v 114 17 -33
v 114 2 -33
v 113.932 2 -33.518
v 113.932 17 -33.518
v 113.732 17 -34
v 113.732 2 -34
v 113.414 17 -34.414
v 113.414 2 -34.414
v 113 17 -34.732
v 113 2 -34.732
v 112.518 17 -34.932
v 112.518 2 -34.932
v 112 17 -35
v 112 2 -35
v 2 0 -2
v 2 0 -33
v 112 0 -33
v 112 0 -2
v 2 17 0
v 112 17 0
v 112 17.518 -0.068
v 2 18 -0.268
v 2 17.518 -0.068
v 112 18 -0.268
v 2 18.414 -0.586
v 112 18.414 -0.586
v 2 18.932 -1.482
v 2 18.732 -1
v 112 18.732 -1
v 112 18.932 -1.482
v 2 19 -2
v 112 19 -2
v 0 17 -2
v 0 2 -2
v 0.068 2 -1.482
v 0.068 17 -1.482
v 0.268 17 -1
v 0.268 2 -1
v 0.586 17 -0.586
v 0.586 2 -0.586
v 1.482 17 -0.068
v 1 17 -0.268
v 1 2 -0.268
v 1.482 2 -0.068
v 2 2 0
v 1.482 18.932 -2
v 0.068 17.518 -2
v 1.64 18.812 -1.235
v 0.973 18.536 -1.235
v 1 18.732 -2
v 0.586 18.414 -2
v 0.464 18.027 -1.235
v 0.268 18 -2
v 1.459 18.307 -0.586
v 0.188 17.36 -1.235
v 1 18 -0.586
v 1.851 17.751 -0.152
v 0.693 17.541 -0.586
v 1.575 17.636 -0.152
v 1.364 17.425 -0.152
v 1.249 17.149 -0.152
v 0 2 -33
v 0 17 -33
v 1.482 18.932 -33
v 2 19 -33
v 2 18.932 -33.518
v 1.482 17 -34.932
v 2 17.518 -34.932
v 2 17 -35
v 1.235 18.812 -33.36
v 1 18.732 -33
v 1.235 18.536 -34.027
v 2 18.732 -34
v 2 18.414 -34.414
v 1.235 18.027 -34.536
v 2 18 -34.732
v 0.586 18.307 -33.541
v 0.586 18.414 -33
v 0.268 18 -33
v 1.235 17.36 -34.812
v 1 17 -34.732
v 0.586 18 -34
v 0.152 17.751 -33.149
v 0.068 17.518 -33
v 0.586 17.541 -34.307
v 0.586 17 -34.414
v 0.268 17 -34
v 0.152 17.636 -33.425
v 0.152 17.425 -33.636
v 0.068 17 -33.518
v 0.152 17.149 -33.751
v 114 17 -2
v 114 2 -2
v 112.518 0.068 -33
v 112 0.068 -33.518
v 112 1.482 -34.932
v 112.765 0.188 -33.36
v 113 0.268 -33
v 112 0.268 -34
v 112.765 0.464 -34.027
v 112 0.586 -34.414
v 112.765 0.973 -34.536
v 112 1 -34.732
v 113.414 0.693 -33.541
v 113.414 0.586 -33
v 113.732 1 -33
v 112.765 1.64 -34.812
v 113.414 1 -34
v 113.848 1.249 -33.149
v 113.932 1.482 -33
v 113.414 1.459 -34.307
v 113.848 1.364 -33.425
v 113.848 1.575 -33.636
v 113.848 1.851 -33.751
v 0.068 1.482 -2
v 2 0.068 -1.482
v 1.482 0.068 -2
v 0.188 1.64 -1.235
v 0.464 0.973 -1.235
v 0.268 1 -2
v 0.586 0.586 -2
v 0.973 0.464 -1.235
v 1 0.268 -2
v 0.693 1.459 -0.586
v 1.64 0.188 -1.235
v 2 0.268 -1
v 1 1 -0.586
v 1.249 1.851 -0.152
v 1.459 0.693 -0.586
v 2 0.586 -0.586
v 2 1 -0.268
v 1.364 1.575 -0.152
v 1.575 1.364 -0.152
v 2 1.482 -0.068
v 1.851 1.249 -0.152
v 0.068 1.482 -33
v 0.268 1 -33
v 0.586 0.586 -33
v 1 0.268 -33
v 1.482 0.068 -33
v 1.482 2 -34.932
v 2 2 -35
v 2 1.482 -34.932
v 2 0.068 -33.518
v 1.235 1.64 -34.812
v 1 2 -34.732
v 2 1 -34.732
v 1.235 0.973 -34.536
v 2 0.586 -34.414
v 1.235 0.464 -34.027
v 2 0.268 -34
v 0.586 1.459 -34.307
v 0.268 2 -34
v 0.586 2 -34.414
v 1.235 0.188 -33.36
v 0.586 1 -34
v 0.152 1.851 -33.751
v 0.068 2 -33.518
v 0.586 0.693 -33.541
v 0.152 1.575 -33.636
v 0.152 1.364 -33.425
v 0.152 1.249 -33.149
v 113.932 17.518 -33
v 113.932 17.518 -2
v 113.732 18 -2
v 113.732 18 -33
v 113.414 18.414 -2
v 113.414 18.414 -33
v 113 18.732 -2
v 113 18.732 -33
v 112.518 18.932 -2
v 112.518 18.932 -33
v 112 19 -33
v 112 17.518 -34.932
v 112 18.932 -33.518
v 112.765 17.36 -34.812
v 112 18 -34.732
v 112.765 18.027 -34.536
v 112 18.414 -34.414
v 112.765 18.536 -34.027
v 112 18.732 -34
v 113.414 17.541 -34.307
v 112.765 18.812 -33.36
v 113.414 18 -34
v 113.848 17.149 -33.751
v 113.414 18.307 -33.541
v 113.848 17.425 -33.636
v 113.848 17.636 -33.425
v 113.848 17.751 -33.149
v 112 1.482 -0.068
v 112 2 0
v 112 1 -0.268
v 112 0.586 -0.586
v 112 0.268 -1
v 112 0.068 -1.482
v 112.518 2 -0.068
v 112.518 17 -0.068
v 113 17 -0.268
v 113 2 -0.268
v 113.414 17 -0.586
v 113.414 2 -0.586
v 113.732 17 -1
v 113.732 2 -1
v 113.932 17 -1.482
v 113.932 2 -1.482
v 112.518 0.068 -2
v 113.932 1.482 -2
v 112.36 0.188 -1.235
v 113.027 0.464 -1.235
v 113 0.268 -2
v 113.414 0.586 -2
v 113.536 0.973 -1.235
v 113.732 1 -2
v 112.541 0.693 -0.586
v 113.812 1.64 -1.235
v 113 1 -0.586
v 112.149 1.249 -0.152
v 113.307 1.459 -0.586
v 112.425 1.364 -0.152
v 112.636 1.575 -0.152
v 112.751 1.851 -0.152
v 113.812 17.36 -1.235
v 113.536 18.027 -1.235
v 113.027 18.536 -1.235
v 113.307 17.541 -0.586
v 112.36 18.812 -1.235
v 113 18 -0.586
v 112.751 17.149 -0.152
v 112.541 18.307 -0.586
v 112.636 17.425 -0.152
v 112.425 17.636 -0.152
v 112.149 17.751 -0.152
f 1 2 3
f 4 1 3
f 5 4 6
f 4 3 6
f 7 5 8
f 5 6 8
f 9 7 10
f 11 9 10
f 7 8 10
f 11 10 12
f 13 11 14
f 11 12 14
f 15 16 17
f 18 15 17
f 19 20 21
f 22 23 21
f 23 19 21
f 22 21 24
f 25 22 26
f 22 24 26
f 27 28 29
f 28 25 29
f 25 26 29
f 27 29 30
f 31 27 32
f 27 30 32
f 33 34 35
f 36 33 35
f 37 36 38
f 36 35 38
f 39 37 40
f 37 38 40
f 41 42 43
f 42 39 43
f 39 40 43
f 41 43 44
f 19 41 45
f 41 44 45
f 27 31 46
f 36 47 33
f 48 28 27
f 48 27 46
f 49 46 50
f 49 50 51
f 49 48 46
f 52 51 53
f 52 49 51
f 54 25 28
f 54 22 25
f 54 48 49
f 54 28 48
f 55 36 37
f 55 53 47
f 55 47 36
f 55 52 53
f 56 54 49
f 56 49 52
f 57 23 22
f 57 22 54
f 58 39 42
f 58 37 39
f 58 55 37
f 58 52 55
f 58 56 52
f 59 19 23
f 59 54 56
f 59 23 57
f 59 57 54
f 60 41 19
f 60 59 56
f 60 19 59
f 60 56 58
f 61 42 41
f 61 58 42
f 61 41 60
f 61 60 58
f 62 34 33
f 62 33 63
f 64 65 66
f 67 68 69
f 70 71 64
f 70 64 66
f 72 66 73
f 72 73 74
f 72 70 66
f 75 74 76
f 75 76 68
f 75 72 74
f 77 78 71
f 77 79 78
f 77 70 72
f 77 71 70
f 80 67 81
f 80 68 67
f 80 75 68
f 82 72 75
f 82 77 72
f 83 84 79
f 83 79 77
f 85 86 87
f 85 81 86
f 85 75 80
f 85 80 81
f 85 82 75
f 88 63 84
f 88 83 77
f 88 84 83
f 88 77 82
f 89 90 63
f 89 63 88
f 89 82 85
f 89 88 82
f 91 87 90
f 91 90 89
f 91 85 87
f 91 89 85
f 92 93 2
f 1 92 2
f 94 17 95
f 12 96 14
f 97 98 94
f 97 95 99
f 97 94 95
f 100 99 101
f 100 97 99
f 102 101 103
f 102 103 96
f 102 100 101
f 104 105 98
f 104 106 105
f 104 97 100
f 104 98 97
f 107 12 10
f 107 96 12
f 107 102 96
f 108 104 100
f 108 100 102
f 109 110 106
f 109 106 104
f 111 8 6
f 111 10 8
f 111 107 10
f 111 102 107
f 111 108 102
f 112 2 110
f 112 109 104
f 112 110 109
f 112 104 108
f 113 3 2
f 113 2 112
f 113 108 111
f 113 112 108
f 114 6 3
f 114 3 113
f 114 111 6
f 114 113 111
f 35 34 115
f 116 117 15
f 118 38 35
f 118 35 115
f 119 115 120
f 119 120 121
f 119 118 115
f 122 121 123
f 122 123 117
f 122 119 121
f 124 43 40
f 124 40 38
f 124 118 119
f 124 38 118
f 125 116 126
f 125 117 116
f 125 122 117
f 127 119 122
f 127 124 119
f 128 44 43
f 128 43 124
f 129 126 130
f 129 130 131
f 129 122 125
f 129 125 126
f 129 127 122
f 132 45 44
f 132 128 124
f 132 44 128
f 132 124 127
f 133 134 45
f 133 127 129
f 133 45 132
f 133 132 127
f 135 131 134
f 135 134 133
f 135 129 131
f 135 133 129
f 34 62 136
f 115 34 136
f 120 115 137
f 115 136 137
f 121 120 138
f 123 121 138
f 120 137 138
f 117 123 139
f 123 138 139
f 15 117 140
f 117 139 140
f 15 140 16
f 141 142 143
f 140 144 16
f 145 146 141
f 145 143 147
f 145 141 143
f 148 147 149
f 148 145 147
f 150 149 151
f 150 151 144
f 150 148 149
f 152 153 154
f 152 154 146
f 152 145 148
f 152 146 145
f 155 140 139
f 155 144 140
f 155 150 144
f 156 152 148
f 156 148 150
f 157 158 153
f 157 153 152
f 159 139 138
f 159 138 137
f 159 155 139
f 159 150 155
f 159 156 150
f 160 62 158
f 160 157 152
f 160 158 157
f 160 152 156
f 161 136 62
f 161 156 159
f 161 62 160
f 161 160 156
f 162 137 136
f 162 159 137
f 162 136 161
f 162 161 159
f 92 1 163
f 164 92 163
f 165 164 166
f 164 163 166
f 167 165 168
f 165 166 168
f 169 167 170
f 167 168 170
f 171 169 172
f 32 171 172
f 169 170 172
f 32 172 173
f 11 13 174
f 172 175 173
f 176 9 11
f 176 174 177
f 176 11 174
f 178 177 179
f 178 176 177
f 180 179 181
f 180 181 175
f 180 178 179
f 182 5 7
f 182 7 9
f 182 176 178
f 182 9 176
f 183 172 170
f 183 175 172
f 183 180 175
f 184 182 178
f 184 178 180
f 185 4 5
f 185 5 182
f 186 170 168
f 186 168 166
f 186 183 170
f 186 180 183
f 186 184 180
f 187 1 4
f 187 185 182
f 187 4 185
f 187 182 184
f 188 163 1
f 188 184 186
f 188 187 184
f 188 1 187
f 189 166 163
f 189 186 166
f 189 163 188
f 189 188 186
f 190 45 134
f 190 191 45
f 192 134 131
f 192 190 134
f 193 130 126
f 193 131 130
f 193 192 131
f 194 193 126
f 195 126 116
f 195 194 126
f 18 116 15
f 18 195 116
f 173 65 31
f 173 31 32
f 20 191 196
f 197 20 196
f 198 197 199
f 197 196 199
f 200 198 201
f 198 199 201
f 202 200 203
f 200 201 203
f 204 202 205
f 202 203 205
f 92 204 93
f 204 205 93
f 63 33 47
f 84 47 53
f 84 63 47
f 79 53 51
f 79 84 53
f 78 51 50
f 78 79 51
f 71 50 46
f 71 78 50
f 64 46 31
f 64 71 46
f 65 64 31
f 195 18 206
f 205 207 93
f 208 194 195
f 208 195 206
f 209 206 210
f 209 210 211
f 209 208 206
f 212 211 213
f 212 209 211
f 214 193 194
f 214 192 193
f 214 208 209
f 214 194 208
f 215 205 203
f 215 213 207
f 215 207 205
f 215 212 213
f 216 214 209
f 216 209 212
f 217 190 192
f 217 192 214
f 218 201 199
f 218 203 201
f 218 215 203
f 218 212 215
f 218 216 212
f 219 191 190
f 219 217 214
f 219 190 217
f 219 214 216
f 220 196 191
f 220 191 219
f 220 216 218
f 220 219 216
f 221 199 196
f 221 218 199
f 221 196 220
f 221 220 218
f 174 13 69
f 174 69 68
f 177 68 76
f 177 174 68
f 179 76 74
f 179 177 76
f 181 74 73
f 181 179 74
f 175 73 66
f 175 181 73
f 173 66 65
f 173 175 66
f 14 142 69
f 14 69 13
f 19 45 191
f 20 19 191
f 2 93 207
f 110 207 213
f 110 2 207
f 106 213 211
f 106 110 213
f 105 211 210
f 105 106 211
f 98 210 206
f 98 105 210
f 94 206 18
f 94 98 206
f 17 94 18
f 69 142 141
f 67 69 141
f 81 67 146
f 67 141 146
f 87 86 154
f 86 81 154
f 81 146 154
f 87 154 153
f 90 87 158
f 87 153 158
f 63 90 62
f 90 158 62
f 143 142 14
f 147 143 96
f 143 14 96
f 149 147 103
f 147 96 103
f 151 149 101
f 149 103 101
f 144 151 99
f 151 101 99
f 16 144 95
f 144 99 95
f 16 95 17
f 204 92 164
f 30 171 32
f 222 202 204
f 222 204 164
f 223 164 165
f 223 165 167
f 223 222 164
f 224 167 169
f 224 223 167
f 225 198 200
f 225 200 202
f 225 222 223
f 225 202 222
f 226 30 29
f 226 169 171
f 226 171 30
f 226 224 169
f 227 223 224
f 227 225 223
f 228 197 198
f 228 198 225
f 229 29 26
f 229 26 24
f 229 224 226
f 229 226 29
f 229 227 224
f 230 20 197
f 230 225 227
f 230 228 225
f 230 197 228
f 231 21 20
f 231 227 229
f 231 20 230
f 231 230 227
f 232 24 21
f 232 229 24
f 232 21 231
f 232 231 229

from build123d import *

# Parameters (mm, degrees)
ESBO_O1_W                = 114
ESBO_O1_H                = 35
RESSALTO_EXTRUS_O1_DEPTH = 19
FILETE1_R                = 2
FILETE2_R                = 2


with BuildPart() as part:
    # Esboço1 → Ressalto-extrusão1 (new body)
    with BuildSketch(Plane(origin=(0, 0, 0), x_dir=(1, 0, 0), z_dir=(0, 1, 0))):
        with Locations((57, 17.5)):
            Rectangle(ESBO_O1_W, ESBO_O1_H)
    extrude(amount=RESSALTO_EXTRUS_O1_DEPTH)

    # Filete1
    filete1_edges = [part.edges().sort_by_distance(p)[0] for p in [
        (114, 19, -17.5),
        (57, 19, -35),
        (0, 19, -17.5),
        (57, 0, -35),
        (114, 0, -17.5),
        (57, 0, 0),
        (0, 0, -17.5),
        (57, 19, 0),
    ]]
    fillet(filete1_edges, radius=FILETE1_R)

    # Filete2
    # the kernel refuses this fillet: 2 mm, written as the material it takes off along each edge
    with BuildSketch(Plane(origin=(2, 2, -33), x_dir=(0, 0, -1), z_dir=(-1, 0, 0))) as filete2_piece_1_section:
        Polygon((0, 0), (FILETE2_R, 0), (FILETE2_R, FILETE2_R), (0, FILETE2_R), align=None)
    filete2_piece_1 = extrude(amount=FILETE2_R, mode=Mode.PRIVATE)
    filete2_piece_1 = filete2_piece_1 - Plane(origin=(2, 2, -33), x_dir=(0, 0.7071067811865475, 0.7071067811865475), z_dir=(-1, 0, 0)) * Sphere(FILETE2_R, mode=Mode.PRIVATE)
    add(filete2_piece_1, mode=Mode.SUBTRACT)
    with BuildSketch(Plane(origin=(112, 2, -33), x_dir=(0, 0, -1), z_dir=(1, 0, 0))) as filete2_piece_2_section:
        Polygon((0, 0), (FILETE2_R, 0), (FILETE2_R, -FILETE2_R), (0, -FILETE2_R), align=None)
    filete2_piece_2 = extrude(amount=FILETE2_R, mode=Mode.PRIVATE)
    filete2_piece_2 = filete2_piece_2 - Plane(origin=(112, 2, -33), x_dir=(0, 0.7071067811865475, 0.7071067811865475), z_dir=(1, 0, 0)) * Sphere(FILETE2_R, mode=Mode.PRIVATE)
    add(filete2_piece_2, mode=Mode.SUBTRACT)
    with BuildSketch(Plane(origin=(2, 2, -2), x_dir=(-1, 0, 0), z_dir=(0, 0, 1))) as filete2_piece_3_section:
        Polygon((0, 0), (FILETE2_R, 0), (FILETE2_R, FILETE2_R), (0, FILETE2_R), align=None)
    filete2_piece_3 = extrude(amount=FILETE2_R, mode=Mode.PRIVATE)
    filete2_piece_3 = filete2_piece_3 - Plane(origin=(2, 2, -2), x_dir=(0.7071067811865475, 0.7071067811865475, 0), z_dir=(0, 0, 1)) * Sphere(FILETE2_R, mode=Mode.PRIVATE)
    add(filete2_piece_3, mode=Mode.SUBTRACT)
    with BuildSketch(Plane(origin=(112, 2, -2), x_dir=(1, 0, 0), z_dir=(0, 0, 1))) as filete2_piece_4_section:
        Polygon((0, 0), (FILETE2_R, 0), (FILETE2_R, -FILETE2_R), (0, -FILETE2_R), align=None)
    filete2_piece_4 = extrude(amount=FILETE2_R, mode=Mode.PRIVATE)
    filete2_piece_4 = filete2_piece_4 - Plane(origin=(112, 2, -2), x_dir=(-0.7071067811865475, 0.7071067811865475, 0), z_dir=(0, 0, 1)) * Sphere(FILETE2_R, mode=Mode.PRIVATE)
    add(filete2_piece_4, mode=Mode.SUBTRACT)
    with BuildSketch(Plane(origin=(112, 17, -2), x_dir=(1, 0, 0), z_dir=(0, 0, 1))) as filete2_piece_5_section:
        Polygon((0, 0), (FILETE2_R, 0), (FILETE2_R, FILETE2_R), (0, FILETE2_R), align=None)
    filete2_piece_5 = extrude(amount=FILETE2_R, mode=Mode.PRIVATE)
    filete2_piece_5 = filete2_piece_5 - Plane(origin=(112, 17, -2), x_dir=(-0.7071067811865475, -0.7071067811865475, 0), z_dir=(0, 0, 1)) * Sphere(FILETE2_R, mode=Mode.PRIVATE)
    add(filete2_piece_5, mode=Mode.SUBTRACT)
    with BuildSketch(Plane(origin=(2, 17, -2), x_dir=(-1, 0, 0), z_dir=(0, 0, 1))) as filete2_piece_6_section:
        Polygon((0, 0), (FILETE2_R, 0), (FILETE2_R, -FILETE2_R), (0, -FILETE2_R), align=None)
    filete2_piece_6 = extrude(amount=FILETE2_R, mode=Mode.PRIVATE)
    filete2_piece_6 = filete2_piece_6 - Plane(origin=(2, 17, -2), x_dir=(0.7071067811865475, -0.7071067811865475, 0), z_dir=(0, 0, 1)) * Sphere(FILETE2_R, mode=Mode.PRIVATE)
    add(filete2_piece_6, mode=Mode.SUBTRACT)
    with BuildSketch(Plane(origin=(112, 17, -33), x_dir=(0, 0, -1), z_dir=(1, 0, 0))) as filete2_piece_7_section:
        Polygon((0, 0), (FILETE2_R, 0), (FILETE2_R, FILETE2_R), (0, FILETE2_R), align=None)
    filete2_piece_7 = extrude(amount=FILETE2_R, mode=Mode.PRIVATE)
    filete2_piece_7 = filete2_piece_7 - Plane(origin=(112, 17, -33), x_dir=(0, -0.7071067811865475, 0.7071067811865475), z_dir=(1, 0, 0)) * Sphere(FILETE2_R, mode=Mode.PRIVATE)
    add(filete2_piece_7, mode=Mode.SUBTRACT)
    with BuildSketch(Plane(origin=(2, 17, -33), x_dir=(0, 0, -1), z_dir=(-1, 0, 0))) as filete2_piece_8_section:
        Polygon((0, 0), (FILETE2_R, 0), (FILETE2_R, -FILETE2_R), (0, -FILETE2_R), align=None)
    filete2_piece_8 = extrude(amount=FILETE2_R, mode=Mode.PRIVATE)
    filete2_piece_8 = filete2_piece_8 - Plane(origin=(2, 17, -33), x_dir=(0, -0.7071067811865475, 0.7071067811865475), z_dir=(-1, 0, 0)) * Sphere(FILETE2_R, mode=Mode.PRIVATE)
    add(filete2_piece_8, mode=Mode.SUBTRACT)
    with BuildSketch(Plane(origin=(114, 2, 0), x_dir=(-1, 0, 0), z_dir=(0, 1, 0)), Plane(origin=(114, 2, -35), x_dir=(0, 0, 1), z_dir=(0, 1, 0))) as filete2_piece_9:
        with BuildLine():
            CenterArc((FILETE2_R, -FILETE2_R), FILETE2_R, 90, 90)
            Line((0, -FILETE2_R), (0, 0))
            Line((0, 0), (FILETE2_R, 0))
        make_face()
    extrude(amount=15, mode=Mode.SUBTRACT)
    with BuildSketch(Plane(origin=(0, 2, 0), x_dir=(1, 0, 0), z_dir=(0, 1, 0)), Plane(origin=(0, 2, -35), x_dir=(0, 0, 1), z_dir=(0, 1, 0))) as filete2_piece_10:
        with BuildLine():
            CenterArc((FILETE2_R, FILETE2_R), FILETE2_R, 180, 90)
            Line((0, FILETE2_R), (0, 0))
            Line((0, 0), (FILETE2_R, 0))
        make_face()
    extrude(amount=15, mode=Mode.SUBTRACT)


solid = part.part
